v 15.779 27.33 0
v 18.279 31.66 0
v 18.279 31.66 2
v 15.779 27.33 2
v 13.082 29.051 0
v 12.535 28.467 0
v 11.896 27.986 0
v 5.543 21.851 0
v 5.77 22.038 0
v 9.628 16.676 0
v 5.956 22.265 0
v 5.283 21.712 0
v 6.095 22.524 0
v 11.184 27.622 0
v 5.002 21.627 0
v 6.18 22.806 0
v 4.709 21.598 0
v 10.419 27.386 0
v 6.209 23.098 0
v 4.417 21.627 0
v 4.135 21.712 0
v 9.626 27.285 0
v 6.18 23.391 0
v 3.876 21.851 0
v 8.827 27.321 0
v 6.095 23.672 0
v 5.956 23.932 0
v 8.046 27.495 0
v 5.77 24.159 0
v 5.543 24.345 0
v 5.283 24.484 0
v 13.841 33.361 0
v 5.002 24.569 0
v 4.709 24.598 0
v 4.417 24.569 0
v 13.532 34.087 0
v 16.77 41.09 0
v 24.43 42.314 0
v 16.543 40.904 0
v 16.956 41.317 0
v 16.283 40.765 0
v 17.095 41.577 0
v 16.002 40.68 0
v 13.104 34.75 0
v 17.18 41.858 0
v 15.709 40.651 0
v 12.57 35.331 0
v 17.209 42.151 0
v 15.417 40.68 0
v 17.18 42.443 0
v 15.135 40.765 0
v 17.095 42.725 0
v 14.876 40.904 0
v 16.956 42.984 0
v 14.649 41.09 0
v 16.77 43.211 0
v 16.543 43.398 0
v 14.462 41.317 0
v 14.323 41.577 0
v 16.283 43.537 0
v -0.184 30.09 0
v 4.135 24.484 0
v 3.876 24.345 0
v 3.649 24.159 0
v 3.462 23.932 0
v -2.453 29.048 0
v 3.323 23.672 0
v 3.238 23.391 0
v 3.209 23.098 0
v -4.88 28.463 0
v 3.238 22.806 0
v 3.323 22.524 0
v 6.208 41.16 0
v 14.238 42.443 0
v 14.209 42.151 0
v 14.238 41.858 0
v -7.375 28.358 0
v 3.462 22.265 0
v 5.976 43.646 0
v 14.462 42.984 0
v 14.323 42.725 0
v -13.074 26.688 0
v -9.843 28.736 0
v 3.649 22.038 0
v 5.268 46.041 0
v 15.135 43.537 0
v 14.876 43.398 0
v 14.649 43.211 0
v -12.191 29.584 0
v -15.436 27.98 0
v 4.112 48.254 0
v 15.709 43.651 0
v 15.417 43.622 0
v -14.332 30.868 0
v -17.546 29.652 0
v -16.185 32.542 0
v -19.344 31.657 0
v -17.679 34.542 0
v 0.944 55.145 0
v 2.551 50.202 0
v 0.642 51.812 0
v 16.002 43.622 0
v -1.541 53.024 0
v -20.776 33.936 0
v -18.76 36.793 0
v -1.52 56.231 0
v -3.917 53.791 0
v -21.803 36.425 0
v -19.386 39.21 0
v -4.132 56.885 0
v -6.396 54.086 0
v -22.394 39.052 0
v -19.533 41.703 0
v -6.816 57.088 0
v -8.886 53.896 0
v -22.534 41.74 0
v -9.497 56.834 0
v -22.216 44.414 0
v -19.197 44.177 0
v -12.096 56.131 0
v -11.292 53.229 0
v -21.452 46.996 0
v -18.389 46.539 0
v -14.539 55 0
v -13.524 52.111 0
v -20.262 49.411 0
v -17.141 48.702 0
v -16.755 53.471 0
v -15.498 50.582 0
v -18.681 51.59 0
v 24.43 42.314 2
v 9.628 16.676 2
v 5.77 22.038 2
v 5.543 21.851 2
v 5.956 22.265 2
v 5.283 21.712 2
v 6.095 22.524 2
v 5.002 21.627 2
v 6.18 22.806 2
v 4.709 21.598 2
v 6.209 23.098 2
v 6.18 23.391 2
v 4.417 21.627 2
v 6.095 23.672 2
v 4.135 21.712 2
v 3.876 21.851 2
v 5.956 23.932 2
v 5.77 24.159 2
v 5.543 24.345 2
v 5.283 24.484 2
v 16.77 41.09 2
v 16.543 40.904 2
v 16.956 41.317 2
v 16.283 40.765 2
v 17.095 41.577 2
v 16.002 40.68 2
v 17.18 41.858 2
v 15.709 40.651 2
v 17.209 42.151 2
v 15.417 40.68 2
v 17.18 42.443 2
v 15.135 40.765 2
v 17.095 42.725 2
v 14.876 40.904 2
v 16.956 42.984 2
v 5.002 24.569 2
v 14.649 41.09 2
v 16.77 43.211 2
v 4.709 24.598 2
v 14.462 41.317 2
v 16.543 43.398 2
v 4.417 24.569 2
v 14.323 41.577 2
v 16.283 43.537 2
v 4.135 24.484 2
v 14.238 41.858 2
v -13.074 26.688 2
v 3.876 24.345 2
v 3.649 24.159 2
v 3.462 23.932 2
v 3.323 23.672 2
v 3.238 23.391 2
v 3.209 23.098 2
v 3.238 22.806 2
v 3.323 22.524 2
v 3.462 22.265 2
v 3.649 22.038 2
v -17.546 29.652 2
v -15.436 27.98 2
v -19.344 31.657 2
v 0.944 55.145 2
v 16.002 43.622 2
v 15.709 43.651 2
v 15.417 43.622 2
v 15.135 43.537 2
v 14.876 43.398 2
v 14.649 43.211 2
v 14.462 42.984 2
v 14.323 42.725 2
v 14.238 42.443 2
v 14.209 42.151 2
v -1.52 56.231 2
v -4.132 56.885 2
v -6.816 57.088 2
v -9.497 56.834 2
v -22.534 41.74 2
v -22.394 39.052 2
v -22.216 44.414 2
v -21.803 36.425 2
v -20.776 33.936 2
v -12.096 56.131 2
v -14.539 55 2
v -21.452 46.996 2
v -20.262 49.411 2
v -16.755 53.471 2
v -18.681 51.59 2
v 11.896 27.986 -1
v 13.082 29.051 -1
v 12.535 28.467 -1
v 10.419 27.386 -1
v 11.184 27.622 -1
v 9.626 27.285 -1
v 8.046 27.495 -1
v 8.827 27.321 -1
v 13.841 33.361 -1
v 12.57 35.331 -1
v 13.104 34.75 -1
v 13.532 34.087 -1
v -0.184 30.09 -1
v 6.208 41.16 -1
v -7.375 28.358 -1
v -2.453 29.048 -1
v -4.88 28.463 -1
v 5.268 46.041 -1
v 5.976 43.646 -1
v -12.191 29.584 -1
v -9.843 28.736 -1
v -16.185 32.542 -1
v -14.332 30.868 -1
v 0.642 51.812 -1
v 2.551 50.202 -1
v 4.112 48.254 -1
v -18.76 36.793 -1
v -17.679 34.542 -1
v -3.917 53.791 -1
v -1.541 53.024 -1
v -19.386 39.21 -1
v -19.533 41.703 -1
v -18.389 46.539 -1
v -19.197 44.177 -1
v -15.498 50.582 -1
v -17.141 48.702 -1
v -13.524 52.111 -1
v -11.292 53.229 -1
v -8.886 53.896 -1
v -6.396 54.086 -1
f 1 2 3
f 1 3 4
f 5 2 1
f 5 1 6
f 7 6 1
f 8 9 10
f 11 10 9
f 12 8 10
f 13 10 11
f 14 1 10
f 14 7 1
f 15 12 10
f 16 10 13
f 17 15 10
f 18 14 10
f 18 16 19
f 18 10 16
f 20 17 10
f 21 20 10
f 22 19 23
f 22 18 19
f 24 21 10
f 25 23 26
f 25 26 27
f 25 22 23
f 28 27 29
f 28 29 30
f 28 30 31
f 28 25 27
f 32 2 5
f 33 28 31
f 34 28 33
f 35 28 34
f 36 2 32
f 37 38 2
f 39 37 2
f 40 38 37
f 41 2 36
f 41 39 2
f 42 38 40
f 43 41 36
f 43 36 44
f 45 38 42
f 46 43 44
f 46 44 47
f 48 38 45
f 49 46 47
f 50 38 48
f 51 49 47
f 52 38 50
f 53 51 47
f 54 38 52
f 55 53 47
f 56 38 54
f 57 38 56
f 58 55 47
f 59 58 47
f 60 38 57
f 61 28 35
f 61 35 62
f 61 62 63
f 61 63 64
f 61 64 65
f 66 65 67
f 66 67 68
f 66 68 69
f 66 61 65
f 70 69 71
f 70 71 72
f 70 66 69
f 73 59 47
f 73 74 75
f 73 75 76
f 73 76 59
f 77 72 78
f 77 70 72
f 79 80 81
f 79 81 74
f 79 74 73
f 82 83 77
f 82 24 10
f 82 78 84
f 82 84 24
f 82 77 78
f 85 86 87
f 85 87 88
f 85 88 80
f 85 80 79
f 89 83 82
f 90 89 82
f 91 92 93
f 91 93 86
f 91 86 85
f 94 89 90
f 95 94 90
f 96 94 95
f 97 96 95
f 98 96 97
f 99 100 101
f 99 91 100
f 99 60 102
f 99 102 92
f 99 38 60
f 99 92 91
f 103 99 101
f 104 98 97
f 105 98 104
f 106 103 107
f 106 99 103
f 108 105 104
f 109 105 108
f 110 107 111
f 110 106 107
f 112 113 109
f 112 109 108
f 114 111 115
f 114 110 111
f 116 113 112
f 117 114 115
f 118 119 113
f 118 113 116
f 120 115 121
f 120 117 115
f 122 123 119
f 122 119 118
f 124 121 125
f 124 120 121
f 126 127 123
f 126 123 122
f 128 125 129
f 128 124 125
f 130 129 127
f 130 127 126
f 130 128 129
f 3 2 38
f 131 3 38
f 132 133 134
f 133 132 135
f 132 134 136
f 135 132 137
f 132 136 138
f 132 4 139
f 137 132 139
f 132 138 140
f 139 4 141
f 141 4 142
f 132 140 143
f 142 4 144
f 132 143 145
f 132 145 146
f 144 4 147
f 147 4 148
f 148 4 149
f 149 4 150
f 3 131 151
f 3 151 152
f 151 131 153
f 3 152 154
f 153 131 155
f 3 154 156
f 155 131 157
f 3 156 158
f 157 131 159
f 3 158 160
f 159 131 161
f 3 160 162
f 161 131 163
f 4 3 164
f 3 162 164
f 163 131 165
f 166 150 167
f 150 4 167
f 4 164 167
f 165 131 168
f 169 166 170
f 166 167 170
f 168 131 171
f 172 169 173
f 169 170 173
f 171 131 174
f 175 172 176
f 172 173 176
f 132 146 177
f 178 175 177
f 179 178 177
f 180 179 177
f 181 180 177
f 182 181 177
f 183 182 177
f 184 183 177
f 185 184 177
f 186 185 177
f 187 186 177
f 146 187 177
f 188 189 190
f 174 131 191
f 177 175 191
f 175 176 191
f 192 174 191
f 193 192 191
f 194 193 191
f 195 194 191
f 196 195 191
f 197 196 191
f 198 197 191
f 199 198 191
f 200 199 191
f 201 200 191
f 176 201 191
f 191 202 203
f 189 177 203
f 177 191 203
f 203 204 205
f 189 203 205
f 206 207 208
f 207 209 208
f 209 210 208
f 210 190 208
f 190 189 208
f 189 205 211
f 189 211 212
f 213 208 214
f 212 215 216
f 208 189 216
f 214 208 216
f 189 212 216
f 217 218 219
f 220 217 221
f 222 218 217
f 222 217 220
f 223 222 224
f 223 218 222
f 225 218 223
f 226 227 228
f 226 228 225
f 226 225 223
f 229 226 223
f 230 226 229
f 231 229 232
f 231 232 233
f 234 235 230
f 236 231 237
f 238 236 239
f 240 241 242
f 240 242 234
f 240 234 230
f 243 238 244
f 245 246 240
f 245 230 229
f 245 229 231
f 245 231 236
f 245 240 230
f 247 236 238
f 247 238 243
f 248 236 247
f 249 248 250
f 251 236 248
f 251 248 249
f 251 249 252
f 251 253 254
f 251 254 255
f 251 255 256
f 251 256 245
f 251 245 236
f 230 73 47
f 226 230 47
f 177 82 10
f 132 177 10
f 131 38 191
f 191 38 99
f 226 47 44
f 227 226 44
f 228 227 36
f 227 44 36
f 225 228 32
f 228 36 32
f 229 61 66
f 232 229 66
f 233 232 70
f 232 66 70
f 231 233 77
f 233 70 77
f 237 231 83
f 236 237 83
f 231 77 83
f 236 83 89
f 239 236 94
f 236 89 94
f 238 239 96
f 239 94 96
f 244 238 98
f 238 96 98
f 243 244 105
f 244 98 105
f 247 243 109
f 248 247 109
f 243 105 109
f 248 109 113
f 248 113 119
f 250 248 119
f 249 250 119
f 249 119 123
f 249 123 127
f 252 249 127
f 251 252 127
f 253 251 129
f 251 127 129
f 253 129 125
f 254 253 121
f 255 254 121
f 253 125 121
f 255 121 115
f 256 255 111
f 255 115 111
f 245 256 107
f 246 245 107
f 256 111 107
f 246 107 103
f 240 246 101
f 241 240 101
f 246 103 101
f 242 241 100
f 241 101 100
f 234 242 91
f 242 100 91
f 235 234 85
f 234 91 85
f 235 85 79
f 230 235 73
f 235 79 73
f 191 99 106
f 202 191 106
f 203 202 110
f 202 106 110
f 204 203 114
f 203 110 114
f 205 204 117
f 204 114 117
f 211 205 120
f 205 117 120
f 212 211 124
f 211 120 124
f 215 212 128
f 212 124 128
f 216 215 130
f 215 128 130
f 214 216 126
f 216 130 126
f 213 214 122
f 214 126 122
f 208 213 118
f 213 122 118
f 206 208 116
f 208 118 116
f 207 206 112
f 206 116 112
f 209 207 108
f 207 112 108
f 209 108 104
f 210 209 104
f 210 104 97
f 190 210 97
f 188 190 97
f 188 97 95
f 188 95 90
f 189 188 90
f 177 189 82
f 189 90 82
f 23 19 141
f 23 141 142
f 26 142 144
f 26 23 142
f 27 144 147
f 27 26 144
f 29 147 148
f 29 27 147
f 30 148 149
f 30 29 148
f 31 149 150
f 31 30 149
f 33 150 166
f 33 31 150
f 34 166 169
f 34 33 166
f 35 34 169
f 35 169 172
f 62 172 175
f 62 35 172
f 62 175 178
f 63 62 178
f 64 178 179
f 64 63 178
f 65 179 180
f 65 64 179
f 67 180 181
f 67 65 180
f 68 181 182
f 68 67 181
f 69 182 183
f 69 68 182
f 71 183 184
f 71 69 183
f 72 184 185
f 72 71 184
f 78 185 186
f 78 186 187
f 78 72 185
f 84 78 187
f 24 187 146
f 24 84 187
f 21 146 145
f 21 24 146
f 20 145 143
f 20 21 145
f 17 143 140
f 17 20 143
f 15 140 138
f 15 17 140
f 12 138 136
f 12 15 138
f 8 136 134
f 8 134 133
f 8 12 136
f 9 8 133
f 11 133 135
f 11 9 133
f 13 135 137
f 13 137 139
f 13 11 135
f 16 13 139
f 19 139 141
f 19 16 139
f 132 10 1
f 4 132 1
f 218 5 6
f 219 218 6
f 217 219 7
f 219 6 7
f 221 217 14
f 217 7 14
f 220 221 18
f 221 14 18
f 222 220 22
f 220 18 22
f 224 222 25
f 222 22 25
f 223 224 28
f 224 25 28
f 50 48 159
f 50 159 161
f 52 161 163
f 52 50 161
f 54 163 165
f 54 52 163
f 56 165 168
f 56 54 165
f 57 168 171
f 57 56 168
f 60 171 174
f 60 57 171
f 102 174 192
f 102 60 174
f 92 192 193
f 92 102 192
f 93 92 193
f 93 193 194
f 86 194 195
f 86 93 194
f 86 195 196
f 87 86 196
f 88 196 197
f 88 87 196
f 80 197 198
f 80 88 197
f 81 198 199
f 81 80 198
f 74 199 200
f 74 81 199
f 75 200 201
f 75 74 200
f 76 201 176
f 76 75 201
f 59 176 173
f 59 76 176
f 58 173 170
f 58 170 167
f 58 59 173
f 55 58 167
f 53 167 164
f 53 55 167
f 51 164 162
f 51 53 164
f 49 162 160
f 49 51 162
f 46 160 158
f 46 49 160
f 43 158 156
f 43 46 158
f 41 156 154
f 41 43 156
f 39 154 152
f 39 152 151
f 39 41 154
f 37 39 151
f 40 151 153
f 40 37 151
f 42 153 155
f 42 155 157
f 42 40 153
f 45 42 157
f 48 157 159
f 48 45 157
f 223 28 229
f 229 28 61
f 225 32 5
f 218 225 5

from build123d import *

# Parameters (mm, degrees)
BOSS_EXTRUDE1_DEPTH = 1
SKETCH1_3_R         = 1.5
BOSS_EXTRUDE2_DEPTH = 2


with BuildPart() as part:
    # Sketch1 → Boss-Extrude1 (new body)
    with BuildSketch(Plane.XY):
        with BuildLine():
            ThreePointArc((13.84093453, 33.361395308), (13.331800916, 34.427699543), (12.569519065, 35.330555089))
            Line((12.569519065, 35.330555089), (6.207550462, 41.160225249))
            ThreePointArc((6.207550462, 41.160225249), (-17.81741665, 47.650937168), (-0.183811683, 30.090061284))
            Line((-0.183811683, 30.090061284), (8.045815072, 27.495269935))
            ThreePointArc((8.045815072, 27.495269935), (10.806658392, 27.487211768), (13.081997543, 29.050910113))
            Line((13.081997543, 29.050910113), (13.84093453, 33.361395308))
        make_face()
    extrude(amount=-BOSS_EXTRUDE1_DEPTH)

    # Sketch1<3> → Boss-Extrude2 (add)
    with BuildSketch(Plane.XY):
        with BuildLine():
            Line((9.627757266, 16.675764747), (15.778866438, 27.329798357))
            Line((15.778866438, 27.329798357), (18.278866438, 31.659925376))
            Line((18.278866438, 31.659925376), (24.429975611, 42.313958986))
            Line((24.429975611, 42.313958986), (0.94372521, 55.144959619))
            ThreePointArc((0.94372521, 55.144959619), (-20.908315232, 48.228438049), (-13.073721217, 26.688496574))
            Line((-13.073721217, 26.688496574), (9.627757266, 16.675764747))
        make_face()
        with Locations((4.709200809, 23.09818313)):
            Circle(SKETCH1_3_R, mode=Mode.SUBTRACT)
        with Locations((15.709200809, 42.150742014)):
            Circle(SKETCH1_3_R, mode=Mode.SUBTRACT)
    extrude(amount=BOSS_EXTRUDE2_DEPTH)


solid = part.part
